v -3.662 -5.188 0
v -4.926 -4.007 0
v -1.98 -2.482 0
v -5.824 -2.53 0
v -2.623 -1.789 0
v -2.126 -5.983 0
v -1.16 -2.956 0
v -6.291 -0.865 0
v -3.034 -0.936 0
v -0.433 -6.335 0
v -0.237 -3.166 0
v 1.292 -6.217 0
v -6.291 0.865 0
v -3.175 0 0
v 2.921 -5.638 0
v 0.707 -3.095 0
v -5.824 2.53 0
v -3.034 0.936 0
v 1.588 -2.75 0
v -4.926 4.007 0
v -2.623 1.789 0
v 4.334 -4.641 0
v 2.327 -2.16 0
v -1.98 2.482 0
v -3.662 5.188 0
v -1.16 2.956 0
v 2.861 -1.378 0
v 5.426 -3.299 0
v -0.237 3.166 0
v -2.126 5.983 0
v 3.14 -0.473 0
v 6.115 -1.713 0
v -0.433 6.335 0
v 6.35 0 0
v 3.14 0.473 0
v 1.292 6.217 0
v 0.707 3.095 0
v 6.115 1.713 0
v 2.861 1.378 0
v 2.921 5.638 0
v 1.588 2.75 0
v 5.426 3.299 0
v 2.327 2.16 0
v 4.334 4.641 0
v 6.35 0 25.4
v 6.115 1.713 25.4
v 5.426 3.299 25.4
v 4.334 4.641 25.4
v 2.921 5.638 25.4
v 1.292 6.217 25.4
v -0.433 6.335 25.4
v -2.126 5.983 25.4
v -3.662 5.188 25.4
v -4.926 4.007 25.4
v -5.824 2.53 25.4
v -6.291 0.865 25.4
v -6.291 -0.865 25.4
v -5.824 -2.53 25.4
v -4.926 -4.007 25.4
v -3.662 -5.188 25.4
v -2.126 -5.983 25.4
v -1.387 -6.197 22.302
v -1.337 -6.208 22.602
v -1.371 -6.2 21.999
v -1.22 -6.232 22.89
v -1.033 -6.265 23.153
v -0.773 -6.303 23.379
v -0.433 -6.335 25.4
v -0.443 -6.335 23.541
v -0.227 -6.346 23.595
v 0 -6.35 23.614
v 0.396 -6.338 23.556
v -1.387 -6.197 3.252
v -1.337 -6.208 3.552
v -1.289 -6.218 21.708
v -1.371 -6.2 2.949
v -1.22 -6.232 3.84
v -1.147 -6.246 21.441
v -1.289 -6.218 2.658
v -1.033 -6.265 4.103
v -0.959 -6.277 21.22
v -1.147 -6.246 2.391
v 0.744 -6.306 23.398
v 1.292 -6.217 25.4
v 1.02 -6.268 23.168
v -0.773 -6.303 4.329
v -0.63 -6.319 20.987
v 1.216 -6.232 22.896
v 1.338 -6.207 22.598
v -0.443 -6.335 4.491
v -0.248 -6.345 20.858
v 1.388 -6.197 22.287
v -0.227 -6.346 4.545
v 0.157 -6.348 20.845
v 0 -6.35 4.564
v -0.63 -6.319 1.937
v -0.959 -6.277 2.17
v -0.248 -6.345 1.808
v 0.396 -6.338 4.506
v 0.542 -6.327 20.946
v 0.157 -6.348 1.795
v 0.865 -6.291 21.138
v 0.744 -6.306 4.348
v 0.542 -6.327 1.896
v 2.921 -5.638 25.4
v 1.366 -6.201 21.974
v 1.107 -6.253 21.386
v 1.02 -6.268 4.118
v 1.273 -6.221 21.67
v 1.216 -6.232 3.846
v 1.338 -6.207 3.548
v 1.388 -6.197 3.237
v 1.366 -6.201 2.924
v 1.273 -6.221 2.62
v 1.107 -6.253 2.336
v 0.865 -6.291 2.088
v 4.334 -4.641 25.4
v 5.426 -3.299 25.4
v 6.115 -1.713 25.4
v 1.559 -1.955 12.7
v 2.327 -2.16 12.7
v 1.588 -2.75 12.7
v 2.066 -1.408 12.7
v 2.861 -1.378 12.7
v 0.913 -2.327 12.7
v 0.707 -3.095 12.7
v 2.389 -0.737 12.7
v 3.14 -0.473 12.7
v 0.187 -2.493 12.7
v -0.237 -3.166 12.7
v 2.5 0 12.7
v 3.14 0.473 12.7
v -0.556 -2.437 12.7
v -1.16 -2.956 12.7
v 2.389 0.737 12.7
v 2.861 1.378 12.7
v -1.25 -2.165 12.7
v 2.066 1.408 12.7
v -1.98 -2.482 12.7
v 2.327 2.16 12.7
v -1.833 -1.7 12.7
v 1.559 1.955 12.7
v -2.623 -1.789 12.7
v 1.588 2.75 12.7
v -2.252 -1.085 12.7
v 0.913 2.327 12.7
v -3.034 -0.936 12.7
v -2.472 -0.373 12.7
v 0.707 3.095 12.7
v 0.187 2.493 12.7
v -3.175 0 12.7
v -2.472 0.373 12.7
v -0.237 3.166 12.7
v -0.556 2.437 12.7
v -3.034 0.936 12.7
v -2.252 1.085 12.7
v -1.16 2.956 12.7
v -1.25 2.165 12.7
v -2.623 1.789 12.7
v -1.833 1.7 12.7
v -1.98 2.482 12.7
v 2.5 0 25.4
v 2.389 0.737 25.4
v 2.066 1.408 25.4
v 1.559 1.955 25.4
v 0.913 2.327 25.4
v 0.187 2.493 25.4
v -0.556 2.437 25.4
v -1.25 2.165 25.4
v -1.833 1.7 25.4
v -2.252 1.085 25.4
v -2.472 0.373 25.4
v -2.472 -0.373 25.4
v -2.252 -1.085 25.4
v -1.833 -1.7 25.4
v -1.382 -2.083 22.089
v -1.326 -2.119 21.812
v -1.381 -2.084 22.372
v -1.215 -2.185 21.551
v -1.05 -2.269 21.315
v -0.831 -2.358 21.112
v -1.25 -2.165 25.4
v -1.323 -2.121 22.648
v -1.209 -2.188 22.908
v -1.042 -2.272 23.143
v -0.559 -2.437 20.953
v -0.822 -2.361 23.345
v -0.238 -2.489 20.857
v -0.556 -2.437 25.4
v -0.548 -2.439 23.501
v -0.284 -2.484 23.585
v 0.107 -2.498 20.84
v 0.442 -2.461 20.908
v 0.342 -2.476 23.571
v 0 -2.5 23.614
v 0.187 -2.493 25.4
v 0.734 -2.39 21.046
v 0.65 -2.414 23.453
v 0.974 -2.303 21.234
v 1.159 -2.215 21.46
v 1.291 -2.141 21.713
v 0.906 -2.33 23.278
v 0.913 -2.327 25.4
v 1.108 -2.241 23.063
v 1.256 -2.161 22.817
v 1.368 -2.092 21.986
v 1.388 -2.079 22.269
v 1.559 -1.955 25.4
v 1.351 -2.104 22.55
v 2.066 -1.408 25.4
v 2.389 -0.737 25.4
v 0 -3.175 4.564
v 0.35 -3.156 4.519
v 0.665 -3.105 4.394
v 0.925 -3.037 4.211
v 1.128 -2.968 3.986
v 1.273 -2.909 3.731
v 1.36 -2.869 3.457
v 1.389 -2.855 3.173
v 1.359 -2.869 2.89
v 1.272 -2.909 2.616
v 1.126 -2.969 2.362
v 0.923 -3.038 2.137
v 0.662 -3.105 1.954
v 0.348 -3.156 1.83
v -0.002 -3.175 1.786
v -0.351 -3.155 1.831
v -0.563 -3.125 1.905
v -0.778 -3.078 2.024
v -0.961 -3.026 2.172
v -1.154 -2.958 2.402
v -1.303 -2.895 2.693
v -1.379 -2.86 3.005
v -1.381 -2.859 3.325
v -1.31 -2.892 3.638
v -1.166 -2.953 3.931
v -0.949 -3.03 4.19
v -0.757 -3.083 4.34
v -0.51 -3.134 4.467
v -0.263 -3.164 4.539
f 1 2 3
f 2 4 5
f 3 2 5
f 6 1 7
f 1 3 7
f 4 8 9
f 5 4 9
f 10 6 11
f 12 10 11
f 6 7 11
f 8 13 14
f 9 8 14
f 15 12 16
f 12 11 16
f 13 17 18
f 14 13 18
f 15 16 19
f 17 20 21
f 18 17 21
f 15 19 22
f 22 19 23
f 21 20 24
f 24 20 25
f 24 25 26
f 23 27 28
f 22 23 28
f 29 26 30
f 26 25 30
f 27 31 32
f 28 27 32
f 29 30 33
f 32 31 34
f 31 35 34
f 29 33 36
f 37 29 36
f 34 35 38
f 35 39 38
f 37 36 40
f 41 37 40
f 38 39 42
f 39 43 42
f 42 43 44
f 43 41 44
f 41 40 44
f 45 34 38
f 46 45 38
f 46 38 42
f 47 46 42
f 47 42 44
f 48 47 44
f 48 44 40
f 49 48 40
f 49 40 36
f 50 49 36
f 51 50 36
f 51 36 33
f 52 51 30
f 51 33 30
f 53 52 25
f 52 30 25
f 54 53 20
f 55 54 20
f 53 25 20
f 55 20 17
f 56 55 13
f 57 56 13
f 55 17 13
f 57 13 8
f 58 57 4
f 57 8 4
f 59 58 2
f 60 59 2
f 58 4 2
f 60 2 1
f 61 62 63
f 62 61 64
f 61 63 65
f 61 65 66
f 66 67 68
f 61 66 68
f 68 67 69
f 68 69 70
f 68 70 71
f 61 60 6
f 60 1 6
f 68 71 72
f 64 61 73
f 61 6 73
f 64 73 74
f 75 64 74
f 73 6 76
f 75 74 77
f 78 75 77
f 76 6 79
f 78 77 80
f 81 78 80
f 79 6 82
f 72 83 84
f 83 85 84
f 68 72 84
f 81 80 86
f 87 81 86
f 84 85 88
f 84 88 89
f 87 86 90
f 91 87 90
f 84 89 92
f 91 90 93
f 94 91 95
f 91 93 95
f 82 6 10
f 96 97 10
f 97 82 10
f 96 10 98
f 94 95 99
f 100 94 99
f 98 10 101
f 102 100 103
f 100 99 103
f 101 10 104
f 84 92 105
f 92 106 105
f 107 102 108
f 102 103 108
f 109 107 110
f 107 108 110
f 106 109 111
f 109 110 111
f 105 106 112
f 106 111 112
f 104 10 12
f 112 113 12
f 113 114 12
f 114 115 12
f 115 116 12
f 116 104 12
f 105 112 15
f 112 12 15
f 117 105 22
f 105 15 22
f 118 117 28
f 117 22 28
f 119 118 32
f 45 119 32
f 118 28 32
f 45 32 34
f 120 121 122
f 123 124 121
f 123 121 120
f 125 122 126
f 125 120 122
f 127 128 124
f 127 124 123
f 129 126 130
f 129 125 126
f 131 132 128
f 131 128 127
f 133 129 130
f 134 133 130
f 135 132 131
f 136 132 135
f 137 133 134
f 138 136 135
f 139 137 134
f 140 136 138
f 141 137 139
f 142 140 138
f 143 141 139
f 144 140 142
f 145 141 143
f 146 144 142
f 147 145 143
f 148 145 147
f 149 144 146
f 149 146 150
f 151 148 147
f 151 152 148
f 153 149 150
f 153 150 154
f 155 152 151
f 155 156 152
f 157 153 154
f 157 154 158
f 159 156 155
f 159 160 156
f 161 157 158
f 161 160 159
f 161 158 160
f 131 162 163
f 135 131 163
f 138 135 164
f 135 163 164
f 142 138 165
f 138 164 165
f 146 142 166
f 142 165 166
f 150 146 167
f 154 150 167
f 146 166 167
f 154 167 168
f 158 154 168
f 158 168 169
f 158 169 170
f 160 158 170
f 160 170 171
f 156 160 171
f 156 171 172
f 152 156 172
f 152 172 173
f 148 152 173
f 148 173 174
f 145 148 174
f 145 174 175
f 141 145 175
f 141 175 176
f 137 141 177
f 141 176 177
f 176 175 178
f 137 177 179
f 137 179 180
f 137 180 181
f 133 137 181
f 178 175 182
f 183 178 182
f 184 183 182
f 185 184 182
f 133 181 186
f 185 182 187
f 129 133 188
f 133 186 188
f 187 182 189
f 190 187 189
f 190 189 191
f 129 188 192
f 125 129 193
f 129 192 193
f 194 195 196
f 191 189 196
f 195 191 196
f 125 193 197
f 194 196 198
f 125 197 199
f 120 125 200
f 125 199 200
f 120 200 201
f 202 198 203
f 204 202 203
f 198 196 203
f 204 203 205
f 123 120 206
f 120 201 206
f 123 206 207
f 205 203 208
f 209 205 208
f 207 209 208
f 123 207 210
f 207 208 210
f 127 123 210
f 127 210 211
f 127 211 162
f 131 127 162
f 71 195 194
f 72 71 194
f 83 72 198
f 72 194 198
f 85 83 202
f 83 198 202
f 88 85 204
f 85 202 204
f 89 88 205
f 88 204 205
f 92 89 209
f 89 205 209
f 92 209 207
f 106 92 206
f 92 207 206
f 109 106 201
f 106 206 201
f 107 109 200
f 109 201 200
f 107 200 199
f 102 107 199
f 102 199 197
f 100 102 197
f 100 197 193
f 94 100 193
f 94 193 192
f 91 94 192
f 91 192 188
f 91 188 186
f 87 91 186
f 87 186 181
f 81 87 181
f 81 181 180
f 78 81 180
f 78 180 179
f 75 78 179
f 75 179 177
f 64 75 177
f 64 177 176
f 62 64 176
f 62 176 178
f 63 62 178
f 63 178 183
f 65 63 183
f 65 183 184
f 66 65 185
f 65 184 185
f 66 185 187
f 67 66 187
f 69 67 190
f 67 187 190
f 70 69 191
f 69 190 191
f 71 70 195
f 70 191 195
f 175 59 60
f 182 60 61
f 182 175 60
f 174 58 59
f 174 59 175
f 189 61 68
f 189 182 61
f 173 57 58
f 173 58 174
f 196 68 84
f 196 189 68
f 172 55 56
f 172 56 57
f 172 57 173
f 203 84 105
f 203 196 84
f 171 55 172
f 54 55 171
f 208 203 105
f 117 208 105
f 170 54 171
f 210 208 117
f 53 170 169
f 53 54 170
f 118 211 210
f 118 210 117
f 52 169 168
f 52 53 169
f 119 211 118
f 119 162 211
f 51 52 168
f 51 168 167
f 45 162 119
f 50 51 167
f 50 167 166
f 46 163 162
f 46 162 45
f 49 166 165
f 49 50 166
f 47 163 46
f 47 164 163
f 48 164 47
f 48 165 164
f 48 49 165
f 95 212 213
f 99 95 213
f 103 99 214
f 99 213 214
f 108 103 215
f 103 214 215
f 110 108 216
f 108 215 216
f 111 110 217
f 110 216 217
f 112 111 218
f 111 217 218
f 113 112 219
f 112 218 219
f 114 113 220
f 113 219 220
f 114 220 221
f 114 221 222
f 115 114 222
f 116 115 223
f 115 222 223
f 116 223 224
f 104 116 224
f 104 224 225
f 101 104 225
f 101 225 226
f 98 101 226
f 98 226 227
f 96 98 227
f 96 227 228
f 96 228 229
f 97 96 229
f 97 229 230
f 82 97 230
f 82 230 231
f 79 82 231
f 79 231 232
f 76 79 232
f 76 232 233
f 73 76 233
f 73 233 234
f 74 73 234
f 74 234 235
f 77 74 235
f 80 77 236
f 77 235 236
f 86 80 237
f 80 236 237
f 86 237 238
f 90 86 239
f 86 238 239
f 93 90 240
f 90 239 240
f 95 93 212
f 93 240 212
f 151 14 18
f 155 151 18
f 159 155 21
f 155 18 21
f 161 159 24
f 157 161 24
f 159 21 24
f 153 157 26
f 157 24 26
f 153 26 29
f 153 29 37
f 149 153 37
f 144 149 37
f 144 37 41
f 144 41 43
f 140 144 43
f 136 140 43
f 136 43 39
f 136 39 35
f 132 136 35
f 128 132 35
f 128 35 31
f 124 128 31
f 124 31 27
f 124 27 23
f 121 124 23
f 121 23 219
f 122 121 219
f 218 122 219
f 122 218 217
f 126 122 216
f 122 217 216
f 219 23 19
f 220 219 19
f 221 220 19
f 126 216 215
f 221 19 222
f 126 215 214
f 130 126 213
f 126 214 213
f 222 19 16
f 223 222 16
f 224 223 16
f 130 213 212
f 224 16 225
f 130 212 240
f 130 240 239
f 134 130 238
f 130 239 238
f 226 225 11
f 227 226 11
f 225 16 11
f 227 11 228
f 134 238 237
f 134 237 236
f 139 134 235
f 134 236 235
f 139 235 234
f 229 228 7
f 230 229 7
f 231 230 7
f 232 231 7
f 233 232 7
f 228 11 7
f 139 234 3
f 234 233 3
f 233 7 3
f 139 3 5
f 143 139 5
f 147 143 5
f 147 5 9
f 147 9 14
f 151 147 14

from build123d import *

# Parameters (mm, degrees)
SKETCH1_R               = 6.35
BOSS_EXTRUDE1_DEPTH     = 25.4
SKETCH2_R               = 2.5
CUT_EXTRUDE1_DEPTH      = 12.7
SKETCH3_R               = 3.175
CUT_EXTRUDE2_DEPTH      = 12.7
CUT_EXTRUDE4_REACH      = 28.941
CUT_EXTRUDE4_END_RADIUS = 6.35
SKETCH4_R               = 1.3890625


with BuildPart() as part:
    # Sketch1 → Boss-Extrude1 (new body)
    with BuildSketch(Plane.XY):
        Circle(SKETCH1_R)
    extrude(amount=BOSS_EXTRUDE1_DEPTH)

    # Sketch2 → Cut-Extrude1 (cut)
    with BuildSketch(Plane.XY.offset(25.4)):
        Circle(SKETCH2_R)
    extrude(amount=-CUT_EXTRUDE1_DEPTH, mode=Mode.SUBTRACT)

    # Sketch3 → Cut-Extrude2 (cut)
    with BuildSketch(Plane(origin=(0, 0, 0), x_dir=(-1, 0, 0), z_dir=(0, 0, -1))):
        Circle(SKETCH3_R)
    extrude(amount=-CUT_EXTRUDE2_DEPTH, mode=Mode.SUBTRACT)

    # Cut-Extrude4: up to this cylinder (the profile starts inside it)
    cut_extrude4_end = Plane(origin=(0, 0, 12.7), z_dir=(0, 0, -1)) * Cylinder(CUT_EXTRUDE4_END_RADIUS, 90.632, mode=Mode.PRIVATE)
    # Sketch4 → Cut-Extrude4 (cut, up to the surface)
    with BuildSketch(Plane(origin=(0, 0, 0), x_dir=(1, 0, 0), z_dir=(0, 1, 0)), mode=Mode.PRIVATE) as cut_extrude4_sk1:
        with Locations(Location((0, -22.225, 0), (0, 0, 270))):
            Circle(SKETCH4_R)
    cut_extrude4_tool1 = extrude(cut_extrude4_sk1.sketch, amount=-CUT_EXTRUDE4_REACH, mode=Mode.PRIVATE) & cut_extrude4_end
    add(cut_extrude4_tool1.solids().sort_by_distance((0, 0, 22.225))[0], mode=Mode.SUBTRACT)
    # Sketch4 → Cut-Extrude4 (cut, up to the surface)
    with BuildSketch(Plane(origin=(0, 0, 0), x_dir=(1, 0, 0), z_dir=(0, 1, 0)), mode=Mode.PRIVATE) as cut_extrude4_sk2:
        with Locations(Location((0, -3.175, 0), (0, 0, 270))):
            Circle(SKETCH4_R)
    cut_extrude4_tool2 = extrude(cut_extrude4_sk2.sketch, amount=-CUT_EXTRUDE4_REACH, mode=Mode.PRIVATE) & cut_extrude4_end
    add(cut_extrude4_tool2.solids().sort_by_distance((0, 0, 3.175))[0], mode=Mode.SUBTRACT)


solid = part.part
